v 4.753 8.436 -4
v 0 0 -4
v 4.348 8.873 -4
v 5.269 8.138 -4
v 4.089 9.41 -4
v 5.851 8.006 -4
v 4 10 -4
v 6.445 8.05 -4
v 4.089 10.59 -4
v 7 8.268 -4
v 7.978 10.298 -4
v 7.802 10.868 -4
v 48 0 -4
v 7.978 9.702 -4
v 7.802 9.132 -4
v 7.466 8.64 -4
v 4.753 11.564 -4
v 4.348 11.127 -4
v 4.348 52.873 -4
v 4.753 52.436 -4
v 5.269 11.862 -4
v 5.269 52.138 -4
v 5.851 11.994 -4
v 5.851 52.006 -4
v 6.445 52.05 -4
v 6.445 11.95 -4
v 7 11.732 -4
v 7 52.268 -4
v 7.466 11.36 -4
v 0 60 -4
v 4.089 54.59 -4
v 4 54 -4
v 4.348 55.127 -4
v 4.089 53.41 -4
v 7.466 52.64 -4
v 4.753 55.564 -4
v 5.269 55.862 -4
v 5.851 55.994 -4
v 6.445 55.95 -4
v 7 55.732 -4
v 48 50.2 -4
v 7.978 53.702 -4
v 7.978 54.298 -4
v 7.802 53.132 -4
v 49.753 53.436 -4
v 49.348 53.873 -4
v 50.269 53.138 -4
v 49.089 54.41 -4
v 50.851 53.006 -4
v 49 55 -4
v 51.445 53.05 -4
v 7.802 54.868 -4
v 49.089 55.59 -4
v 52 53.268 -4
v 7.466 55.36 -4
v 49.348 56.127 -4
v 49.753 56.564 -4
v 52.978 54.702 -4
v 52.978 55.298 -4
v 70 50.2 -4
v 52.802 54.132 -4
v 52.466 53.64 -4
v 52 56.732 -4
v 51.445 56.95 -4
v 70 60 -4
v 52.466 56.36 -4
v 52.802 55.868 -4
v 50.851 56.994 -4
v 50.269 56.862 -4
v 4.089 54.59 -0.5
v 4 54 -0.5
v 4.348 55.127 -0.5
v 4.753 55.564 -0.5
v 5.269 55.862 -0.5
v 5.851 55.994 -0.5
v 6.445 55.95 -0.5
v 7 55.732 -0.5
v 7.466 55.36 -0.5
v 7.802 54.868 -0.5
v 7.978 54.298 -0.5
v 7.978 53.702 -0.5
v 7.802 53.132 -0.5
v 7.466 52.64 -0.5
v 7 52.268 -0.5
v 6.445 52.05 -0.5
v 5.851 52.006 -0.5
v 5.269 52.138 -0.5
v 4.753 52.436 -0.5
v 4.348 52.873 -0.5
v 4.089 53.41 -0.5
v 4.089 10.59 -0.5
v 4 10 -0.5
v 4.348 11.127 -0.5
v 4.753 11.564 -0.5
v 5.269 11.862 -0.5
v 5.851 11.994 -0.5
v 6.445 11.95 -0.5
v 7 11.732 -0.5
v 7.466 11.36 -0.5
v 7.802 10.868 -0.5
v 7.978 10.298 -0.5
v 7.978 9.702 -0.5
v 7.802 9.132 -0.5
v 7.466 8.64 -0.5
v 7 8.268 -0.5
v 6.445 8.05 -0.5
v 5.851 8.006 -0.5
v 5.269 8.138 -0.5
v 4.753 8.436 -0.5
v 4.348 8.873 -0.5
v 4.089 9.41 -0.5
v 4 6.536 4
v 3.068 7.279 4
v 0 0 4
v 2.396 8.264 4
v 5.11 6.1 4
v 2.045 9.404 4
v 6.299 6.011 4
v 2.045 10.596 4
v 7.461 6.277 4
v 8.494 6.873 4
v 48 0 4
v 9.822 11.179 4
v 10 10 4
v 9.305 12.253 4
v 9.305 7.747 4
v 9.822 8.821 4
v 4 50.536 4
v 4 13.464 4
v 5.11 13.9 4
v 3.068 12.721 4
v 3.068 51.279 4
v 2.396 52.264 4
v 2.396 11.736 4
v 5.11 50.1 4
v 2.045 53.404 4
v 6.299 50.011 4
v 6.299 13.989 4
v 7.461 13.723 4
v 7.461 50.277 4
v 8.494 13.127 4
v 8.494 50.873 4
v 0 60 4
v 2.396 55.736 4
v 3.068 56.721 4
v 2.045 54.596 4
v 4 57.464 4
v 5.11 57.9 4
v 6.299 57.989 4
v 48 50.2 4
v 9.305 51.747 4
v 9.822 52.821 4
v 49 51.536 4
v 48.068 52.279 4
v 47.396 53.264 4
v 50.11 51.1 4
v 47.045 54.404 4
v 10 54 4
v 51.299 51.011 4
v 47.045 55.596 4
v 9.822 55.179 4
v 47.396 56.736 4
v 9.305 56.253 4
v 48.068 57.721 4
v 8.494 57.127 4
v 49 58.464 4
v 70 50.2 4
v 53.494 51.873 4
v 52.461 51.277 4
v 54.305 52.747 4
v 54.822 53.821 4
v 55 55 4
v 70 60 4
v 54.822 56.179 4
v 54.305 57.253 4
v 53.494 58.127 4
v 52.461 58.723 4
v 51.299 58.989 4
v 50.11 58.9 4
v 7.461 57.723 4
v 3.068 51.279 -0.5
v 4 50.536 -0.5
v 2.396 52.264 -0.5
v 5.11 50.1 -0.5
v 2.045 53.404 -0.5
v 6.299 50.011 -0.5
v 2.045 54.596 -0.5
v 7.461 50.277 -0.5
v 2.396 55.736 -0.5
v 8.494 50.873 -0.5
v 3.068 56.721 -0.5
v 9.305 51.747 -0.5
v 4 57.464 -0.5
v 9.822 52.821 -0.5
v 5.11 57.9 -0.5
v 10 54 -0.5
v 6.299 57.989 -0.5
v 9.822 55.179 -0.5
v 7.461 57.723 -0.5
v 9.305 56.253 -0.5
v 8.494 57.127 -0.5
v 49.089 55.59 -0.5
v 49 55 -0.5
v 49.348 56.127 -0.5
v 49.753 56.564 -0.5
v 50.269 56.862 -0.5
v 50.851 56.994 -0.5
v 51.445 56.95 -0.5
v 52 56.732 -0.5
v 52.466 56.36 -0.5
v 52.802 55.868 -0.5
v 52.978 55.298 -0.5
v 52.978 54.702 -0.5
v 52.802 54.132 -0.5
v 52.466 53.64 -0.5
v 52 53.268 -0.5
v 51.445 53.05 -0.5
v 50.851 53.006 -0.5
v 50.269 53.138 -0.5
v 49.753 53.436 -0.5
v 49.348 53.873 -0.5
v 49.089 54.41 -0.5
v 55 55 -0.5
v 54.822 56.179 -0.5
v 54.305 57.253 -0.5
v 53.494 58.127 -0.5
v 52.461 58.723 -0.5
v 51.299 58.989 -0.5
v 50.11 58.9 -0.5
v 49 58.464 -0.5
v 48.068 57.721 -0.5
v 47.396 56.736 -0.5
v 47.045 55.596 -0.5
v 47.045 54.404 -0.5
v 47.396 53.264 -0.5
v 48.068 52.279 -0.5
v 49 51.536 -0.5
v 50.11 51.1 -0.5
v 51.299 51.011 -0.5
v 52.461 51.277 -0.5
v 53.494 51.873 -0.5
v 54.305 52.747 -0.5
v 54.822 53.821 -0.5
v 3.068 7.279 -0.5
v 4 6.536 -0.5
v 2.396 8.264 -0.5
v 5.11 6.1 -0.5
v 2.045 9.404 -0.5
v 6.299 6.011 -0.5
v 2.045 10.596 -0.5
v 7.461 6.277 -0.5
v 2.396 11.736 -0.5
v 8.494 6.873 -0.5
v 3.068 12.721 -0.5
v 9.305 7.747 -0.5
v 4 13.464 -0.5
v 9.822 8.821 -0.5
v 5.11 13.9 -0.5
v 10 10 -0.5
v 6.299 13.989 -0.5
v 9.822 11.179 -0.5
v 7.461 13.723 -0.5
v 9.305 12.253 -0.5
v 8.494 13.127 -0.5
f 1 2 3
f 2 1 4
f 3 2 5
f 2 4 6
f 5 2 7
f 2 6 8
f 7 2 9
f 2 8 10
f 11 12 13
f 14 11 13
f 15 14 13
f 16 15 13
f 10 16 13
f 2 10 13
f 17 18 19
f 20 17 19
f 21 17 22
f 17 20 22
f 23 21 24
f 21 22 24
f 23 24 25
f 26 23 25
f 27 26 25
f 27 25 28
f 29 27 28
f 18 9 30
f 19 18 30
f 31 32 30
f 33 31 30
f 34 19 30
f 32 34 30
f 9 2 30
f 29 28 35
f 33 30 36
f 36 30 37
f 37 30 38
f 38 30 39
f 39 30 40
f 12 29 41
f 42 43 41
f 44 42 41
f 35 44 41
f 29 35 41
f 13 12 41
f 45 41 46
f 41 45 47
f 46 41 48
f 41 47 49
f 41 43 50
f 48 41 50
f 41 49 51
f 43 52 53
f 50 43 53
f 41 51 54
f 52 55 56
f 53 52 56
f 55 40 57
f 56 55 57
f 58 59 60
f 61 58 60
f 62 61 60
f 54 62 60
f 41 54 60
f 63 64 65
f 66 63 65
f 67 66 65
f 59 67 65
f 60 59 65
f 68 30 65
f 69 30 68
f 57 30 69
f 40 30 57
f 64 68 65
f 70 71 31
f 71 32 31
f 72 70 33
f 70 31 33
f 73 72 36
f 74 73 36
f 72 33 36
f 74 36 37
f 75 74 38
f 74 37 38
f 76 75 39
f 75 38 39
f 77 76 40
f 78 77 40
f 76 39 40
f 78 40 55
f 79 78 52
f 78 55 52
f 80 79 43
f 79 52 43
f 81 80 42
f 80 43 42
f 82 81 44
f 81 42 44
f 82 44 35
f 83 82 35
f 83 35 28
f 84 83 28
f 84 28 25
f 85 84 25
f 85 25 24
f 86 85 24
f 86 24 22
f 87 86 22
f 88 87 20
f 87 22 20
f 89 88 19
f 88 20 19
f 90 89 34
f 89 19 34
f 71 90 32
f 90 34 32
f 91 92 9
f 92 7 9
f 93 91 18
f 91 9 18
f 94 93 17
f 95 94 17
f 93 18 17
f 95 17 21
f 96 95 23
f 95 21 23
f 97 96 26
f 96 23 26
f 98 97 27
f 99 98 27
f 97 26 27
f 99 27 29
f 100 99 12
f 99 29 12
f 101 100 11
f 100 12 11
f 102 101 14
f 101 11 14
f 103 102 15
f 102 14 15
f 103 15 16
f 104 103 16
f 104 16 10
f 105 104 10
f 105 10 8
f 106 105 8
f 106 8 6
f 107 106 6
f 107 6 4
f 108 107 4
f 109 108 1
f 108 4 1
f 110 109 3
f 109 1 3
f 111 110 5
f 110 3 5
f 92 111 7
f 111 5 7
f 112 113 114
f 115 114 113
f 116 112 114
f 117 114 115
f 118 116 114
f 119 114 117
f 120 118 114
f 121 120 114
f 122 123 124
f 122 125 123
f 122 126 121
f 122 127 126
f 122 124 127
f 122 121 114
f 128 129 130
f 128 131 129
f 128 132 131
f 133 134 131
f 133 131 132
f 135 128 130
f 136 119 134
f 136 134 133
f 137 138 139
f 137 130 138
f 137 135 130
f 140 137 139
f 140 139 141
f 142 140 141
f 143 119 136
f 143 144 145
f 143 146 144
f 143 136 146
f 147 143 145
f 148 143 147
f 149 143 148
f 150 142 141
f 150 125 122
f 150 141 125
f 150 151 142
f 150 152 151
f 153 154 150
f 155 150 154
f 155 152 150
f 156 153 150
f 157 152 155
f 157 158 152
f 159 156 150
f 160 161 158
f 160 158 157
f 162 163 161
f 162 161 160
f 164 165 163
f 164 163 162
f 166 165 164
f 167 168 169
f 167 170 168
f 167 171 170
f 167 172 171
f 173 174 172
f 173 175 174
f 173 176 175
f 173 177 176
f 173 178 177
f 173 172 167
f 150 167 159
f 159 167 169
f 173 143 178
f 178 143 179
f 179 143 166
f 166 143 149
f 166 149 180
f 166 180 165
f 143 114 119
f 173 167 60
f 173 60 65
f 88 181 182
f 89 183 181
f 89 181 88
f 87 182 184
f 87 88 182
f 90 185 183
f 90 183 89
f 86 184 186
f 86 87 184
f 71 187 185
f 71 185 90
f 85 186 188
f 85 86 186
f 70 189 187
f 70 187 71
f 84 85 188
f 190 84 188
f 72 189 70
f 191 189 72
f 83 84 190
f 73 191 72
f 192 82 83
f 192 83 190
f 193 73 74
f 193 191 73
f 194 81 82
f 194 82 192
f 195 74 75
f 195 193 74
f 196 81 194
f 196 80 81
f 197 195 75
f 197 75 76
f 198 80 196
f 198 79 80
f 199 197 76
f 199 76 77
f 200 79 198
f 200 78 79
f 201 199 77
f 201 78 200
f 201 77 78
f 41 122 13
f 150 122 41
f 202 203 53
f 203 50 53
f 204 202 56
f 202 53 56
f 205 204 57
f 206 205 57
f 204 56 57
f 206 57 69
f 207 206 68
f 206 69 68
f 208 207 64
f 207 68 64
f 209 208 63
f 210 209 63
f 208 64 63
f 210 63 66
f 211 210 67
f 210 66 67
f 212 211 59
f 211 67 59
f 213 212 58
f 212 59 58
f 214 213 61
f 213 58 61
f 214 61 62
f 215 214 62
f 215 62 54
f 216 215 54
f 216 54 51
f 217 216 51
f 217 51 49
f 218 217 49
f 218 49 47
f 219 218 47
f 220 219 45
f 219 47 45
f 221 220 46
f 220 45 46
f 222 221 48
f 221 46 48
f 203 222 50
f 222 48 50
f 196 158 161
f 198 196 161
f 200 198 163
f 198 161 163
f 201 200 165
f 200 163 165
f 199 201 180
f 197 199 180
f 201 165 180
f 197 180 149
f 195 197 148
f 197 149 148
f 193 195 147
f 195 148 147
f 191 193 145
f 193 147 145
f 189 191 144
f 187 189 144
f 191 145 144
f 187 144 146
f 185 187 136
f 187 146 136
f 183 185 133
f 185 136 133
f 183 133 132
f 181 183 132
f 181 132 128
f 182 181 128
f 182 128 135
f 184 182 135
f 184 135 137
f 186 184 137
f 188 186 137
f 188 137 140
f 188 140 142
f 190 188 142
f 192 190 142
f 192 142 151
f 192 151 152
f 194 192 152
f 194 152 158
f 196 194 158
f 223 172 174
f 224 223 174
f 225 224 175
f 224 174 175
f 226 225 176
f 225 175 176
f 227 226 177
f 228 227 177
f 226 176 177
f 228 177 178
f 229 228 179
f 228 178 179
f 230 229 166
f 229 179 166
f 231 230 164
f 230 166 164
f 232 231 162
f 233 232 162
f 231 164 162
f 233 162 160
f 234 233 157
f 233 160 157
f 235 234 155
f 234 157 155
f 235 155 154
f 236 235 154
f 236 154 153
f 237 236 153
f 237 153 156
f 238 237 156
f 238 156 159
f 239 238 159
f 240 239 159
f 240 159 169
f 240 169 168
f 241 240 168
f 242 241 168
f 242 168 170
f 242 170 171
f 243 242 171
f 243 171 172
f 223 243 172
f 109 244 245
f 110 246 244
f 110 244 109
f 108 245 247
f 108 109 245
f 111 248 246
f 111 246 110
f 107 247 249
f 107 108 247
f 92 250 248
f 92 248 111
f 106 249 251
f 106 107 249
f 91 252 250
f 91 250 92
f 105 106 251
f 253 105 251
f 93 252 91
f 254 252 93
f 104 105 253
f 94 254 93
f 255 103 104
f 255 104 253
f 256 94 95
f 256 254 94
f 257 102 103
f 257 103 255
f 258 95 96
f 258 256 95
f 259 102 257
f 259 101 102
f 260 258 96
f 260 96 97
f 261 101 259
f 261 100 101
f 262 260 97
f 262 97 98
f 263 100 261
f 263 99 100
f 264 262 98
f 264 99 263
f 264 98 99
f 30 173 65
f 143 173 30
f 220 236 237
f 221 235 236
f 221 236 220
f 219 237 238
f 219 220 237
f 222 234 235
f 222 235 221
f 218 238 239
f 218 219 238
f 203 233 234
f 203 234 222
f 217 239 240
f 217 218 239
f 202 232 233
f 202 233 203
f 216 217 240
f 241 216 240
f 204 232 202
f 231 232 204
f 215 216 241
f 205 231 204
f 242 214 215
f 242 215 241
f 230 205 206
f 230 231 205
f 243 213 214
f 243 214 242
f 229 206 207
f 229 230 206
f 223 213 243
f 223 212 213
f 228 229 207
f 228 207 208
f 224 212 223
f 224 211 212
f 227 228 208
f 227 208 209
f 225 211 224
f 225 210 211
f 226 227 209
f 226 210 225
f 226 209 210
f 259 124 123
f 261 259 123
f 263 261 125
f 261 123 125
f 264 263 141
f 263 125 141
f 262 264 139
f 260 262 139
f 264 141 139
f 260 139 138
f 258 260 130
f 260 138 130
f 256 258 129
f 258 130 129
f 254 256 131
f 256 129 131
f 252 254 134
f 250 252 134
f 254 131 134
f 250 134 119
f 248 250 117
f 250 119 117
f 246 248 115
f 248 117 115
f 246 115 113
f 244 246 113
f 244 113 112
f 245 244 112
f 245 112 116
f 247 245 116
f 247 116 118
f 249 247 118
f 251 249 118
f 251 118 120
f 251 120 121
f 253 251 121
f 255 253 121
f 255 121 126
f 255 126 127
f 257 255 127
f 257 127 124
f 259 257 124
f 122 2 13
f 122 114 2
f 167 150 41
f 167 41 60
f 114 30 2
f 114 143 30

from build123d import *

# Parameters (mm, degrees)
BOSS_EXTRUDE1_DEPTH                     = 4
CBORE_FOR_M5_HEX_HEAD_BOLT1_D           = 4
CBORE_FOR_M5_HEX_HEAD_BOLT1_CBORE_D     = 8
CBORE_FOR_M5_HEX_HEAD_BOLT1_CBORE_DEPTH = 4.5


with BuildPart() as part:
    # Sketch1 → Boss-Extrude1 (new, symmetric)
    with BuildSketch(Plane.XY):
        Polygon((0, 44.484987277), (0, 0), (48, 0), (48, 50.2), (70, 50.2), (70, 60), (35, 60), (0, 60), align=None)
    extrude(amount=BOSS_EXTRUDE1_DEPTH, both=True)

    # CBORE for M5 Hex Head Bolt1 (through all)
    with Locations(Plane.XY.offset(4)):
        with Locations((6, 10), (6, 54), (51, 55)):
            CounterBoreHole(CBORE_FOR_M5_HEX_HEAD_BOLT1_D / 2, CBORE_FOR_M5_HEX_HEAD_BOLT1_CBORE_D / 2, CBORE_FOR_M5_HEX_HEAD_BOLT1_CBORE_DEPTH)


solid = part.part
